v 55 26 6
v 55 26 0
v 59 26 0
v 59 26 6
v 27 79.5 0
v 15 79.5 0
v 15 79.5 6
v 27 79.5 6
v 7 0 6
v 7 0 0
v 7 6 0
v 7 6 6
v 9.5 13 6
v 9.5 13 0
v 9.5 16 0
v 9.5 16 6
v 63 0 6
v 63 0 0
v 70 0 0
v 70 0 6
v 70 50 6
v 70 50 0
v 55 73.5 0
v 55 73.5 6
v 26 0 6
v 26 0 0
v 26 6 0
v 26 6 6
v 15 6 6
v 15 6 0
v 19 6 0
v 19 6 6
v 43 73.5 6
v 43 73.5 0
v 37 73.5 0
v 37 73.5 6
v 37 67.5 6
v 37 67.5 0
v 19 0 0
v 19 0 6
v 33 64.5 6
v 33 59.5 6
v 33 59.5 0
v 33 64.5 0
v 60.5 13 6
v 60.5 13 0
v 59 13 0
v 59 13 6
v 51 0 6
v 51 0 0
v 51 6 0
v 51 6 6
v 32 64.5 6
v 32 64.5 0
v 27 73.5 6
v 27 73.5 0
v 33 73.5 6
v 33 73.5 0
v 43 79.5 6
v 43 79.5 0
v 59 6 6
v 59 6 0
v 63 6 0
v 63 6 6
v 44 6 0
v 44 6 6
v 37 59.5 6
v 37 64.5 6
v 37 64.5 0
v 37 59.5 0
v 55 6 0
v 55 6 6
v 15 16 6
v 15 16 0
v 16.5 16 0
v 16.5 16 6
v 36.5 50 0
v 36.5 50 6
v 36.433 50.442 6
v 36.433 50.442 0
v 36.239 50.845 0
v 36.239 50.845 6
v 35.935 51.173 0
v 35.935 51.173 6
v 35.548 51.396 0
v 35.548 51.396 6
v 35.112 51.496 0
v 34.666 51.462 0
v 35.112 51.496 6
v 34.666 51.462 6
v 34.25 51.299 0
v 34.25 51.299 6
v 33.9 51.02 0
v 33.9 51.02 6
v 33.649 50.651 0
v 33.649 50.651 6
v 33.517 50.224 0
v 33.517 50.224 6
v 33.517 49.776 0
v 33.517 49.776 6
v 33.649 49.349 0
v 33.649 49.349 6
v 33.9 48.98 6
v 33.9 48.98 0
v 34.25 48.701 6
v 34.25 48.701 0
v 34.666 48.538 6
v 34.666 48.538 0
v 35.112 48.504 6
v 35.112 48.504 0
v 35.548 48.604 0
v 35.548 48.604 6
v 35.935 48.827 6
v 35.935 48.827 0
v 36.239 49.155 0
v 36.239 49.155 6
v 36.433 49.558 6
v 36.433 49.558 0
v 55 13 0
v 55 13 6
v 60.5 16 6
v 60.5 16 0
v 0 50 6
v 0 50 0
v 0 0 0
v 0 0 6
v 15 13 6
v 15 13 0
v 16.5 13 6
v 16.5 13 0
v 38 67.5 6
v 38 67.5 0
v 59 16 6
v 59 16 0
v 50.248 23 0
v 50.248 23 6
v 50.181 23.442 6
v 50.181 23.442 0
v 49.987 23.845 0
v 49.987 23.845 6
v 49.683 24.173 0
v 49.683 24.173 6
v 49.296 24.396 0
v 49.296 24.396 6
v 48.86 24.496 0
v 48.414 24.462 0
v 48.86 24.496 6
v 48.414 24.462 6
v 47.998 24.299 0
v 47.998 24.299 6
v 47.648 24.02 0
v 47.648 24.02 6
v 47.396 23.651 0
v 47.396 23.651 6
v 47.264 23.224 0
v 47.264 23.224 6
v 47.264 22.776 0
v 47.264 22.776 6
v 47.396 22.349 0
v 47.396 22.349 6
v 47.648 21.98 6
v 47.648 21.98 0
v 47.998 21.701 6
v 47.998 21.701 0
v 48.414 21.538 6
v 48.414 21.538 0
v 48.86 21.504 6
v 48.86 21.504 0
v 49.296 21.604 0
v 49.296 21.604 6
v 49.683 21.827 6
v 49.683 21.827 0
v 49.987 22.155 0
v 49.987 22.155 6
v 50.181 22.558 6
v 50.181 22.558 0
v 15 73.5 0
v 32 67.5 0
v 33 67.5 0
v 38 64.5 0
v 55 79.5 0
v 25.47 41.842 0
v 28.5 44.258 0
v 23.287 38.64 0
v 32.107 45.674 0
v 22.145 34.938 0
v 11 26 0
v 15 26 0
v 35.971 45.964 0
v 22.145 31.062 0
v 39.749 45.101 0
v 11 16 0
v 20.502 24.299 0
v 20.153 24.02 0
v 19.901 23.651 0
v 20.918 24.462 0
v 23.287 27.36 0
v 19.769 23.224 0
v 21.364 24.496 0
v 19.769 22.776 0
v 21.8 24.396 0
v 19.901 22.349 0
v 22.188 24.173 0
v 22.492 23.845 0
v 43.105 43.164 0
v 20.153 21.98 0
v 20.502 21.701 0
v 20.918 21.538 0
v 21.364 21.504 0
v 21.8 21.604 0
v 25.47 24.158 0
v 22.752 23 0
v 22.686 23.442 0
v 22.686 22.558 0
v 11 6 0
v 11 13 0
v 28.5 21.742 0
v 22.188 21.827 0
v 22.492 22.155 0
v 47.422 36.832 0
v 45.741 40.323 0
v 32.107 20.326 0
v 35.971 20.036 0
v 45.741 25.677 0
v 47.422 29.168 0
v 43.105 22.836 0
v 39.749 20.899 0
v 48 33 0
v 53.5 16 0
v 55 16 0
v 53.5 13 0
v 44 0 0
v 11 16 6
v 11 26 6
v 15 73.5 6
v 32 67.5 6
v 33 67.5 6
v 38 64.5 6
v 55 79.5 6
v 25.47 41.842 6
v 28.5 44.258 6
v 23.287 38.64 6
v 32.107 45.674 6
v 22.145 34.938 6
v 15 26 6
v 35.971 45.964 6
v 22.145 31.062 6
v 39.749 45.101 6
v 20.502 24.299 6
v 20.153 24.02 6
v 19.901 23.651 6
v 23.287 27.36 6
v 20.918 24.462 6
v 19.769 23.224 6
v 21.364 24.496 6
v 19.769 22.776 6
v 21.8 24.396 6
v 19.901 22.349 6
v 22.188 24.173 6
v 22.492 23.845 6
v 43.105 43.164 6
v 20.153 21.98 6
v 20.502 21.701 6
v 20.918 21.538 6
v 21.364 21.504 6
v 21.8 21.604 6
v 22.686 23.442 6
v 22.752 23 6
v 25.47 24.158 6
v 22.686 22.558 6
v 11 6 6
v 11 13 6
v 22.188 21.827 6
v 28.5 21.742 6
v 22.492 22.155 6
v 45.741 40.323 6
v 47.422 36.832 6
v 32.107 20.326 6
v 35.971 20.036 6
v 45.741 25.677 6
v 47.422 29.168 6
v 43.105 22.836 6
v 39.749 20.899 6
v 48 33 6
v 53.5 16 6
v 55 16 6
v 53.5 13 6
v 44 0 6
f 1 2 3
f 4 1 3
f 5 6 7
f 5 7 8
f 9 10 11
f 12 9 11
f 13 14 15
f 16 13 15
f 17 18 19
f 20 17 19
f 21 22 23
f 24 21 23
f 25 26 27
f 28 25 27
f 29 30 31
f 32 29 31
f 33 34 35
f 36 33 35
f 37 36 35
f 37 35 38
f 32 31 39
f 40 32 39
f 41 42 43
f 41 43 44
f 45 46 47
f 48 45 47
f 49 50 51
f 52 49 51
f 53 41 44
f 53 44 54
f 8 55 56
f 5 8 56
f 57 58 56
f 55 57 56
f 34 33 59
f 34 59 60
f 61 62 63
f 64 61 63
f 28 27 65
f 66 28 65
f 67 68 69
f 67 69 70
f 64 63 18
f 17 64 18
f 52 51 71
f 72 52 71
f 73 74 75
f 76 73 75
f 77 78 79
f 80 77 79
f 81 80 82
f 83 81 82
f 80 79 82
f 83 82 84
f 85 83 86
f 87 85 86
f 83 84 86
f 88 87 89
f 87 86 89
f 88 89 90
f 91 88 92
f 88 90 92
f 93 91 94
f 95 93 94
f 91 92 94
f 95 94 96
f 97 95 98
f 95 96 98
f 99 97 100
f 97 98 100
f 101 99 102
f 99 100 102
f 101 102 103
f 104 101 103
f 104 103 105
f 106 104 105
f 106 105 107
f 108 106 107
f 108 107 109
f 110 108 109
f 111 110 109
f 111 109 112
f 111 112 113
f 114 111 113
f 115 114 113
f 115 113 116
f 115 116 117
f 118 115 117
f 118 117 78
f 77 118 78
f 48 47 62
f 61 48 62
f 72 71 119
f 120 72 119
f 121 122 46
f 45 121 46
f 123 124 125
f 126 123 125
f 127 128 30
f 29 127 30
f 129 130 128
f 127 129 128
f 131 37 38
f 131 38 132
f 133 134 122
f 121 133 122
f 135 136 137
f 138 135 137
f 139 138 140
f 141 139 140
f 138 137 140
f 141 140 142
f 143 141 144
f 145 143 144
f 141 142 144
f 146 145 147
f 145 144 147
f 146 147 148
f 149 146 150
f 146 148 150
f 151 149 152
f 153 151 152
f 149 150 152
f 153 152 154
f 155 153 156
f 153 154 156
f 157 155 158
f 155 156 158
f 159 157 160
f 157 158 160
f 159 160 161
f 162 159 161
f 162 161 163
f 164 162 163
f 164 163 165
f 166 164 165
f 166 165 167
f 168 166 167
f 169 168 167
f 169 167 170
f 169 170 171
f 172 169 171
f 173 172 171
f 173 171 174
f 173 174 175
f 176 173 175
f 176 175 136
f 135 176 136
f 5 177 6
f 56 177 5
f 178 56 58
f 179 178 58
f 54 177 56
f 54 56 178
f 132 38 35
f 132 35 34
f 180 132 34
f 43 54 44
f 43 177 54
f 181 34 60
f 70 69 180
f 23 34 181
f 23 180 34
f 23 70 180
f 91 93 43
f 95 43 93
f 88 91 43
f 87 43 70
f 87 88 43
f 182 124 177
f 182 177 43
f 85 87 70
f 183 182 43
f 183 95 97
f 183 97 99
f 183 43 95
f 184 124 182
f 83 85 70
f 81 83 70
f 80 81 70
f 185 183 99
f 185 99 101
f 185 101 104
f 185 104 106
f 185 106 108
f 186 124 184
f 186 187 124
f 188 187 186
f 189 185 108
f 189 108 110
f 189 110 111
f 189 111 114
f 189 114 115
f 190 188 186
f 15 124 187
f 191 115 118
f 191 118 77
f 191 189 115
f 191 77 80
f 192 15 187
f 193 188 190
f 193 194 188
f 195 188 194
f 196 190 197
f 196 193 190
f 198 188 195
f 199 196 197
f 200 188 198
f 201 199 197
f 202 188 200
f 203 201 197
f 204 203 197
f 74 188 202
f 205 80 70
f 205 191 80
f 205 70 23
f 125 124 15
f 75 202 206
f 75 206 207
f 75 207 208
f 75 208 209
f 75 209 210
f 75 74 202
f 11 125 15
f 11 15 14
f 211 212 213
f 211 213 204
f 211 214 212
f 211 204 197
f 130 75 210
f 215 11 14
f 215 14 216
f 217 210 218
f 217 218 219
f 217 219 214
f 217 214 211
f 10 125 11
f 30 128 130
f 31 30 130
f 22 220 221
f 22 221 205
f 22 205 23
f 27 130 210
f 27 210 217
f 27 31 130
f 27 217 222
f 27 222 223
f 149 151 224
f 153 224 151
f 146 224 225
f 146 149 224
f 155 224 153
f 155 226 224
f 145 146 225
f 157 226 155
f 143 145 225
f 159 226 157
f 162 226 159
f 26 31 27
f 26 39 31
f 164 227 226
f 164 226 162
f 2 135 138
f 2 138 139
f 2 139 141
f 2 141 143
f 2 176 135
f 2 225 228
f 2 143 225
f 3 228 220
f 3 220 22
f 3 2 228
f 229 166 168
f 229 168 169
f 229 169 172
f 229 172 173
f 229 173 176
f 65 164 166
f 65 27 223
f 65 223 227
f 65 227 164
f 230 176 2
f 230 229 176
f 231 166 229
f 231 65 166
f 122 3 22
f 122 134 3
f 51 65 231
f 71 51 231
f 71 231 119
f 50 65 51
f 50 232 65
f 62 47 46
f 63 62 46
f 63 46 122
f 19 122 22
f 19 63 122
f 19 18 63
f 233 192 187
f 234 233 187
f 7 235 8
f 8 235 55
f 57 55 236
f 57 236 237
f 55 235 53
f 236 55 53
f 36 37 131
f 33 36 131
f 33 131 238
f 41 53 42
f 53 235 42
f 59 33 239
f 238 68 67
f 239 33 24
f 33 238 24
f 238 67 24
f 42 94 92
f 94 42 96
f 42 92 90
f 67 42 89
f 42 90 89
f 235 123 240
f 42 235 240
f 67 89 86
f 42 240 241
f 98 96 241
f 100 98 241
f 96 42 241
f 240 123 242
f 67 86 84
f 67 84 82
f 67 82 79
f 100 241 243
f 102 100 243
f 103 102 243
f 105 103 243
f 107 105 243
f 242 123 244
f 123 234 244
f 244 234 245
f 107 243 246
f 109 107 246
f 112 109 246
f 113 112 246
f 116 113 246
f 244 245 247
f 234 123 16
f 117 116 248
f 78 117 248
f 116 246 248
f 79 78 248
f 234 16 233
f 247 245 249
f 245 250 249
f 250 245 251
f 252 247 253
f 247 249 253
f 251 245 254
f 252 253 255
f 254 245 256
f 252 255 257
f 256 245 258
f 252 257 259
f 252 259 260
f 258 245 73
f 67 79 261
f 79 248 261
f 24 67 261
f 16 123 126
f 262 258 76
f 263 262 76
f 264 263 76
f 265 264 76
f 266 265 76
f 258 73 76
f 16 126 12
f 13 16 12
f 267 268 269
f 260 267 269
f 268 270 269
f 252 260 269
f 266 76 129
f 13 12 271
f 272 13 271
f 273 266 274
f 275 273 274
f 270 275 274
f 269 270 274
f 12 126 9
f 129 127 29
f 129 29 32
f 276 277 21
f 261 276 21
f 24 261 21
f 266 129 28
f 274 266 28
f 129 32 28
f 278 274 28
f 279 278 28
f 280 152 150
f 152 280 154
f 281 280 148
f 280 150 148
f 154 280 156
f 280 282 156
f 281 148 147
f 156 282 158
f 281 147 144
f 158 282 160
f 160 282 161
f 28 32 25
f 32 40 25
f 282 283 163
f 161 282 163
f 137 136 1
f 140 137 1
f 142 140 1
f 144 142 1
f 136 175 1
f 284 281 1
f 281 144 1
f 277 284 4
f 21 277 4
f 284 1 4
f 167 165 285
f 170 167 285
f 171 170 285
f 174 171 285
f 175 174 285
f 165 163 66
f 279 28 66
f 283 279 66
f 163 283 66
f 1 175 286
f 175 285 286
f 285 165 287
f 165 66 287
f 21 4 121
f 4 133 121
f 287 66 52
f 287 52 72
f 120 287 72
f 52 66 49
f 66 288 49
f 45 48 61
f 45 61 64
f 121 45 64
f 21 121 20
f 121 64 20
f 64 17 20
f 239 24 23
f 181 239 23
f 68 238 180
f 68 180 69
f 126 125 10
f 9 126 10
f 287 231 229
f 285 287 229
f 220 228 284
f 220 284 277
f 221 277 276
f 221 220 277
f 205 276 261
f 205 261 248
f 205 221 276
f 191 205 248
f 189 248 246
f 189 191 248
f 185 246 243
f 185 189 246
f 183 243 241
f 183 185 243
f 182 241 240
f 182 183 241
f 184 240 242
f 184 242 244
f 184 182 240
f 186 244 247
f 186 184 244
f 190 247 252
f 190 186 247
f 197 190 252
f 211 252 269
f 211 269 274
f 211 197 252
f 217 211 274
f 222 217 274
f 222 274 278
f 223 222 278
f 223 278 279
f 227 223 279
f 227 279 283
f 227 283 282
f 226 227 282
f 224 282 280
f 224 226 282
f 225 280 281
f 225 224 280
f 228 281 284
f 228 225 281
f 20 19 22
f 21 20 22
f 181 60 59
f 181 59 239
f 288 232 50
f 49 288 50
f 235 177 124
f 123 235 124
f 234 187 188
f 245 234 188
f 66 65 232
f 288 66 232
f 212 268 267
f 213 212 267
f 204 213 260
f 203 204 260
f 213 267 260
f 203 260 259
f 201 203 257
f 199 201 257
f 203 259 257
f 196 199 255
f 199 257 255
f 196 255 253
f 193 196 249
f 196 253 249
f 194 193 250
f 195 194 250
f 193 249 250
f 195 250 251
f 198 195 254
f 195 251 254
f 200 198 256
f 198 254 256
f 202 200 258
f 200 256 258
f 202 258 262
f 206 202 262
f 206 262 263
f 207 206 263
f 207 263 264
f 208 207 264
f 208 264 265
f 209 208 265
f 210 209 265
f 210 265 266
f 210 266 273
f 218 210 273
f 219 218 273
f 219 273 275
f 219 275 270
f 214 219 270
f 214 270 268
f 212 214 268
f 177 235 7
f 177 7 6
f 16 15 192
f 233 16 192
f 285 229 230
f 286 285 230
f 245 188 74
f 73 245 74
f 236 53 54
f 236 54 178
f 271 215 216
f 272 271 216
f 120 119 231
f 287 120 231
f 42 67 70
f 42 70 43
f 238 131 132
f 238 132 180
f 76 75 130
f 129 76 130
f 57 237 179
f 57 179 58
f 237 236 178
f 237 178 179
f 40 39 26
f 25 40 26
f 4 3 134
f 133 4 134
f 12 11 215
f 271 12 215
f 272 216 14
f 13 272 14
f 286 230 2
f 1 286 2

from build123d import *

# Parameters (mm, degrees)
ESQUISSE1_R             = 13
BOSS_EXTRU_1_DEPTH      = 6
ESQUISSE2_W             = 12
ESQUISSE2_H             = 6
BOSS_EXTRU_2_DEPTH      = 6
ESQUISSE3_R             = 1.5
ENL_V_MAT_EXTRU_1_DEPTH = 10
ENL_V_MAT_EXTRU_2_DEPTH = 10


with BuildPart() as part:
    # Esquisse1 → Boss.-Extru.1 (new body)
    with BuildSketch(Plane.XY):
        Polygon((55, 13), (53.5, 13), (53.5, 16), (55, 16), (55, 26), (59, 26), (59, 16), (60.5, 16), (60.5, 13), (59, 13), (59, 6), (63, 6), (63, 0), (70, 0), (70, 50), (55, 73.5), (15, 73.5), (0, 50), (0, 0), (7, 0), (7, 6), (11, 6), (11, 13), (9.5, 13), (9.5, 16), (11, 16), (11, 26), (15, 26), (15, 16), (16.5, 16), (16.5, 13), (15, 13), (15, 6), (19, 6), (19, 0), (26, 0), (26, 6), (44, 6), (44, 0), (51, 0), (51, 6), (55, 6), align=None)
        with Locations((35, 33)):
            Circle(ESQUISSE1_R, mode=Mode.SUBTRACT)
    extrude(amount=BOSS_EXTRU_1_DEPTH)

    # Esquisse2 → Boss.-Extru.2 (add)
    with BuildSketch(Plane(origin=(0, 73.5, 0), x_dir=(1, 0, 0), z_dir=(0, 1, 0))):
        with Locations((21, -3)):
            Rectangle(ESQUISSE2_W, ESQUISSE2_H)
        with Locations((49, -3)):
            Rectangle(ESQUISSE2_W, ESQUISSE2_H)
    extrude(amount=BOSS_EXTRU_2_DEPTH)

    # Esquisse3 → Enlèv. mat.-Extru.1 (cut)
    with BuildSketch(Plane.XY.offset(6)):
        with Locations((21.252272915, 23)):
            Circle(ESQUISSE3_R)
        with Locations((48.747727085, 23)):
            Circle(ESQUISSE3_R)
        with Locations((35, 50)):
            Circle(ESQUISSE3_R)
    extrude(amount=-ENL_V_MAT_EXTRU_1_DEPTH, mode=Mode.SUBTRACT)

    # Esquisse4 → Enlèv. mat.-Extru.2 (cut)
    with BuildSketch(Plane.XY.offset(6)):
        Polygon((33, 73.5), (37, 73.5), (37, 67.5), (38, 67.5), (38, 64.5), (37, 64.5), (37, 59.5), (33, 59.5), (33, 64.5), (32, 64.5), (32, 67.5), (33, 67.5), align=None)
    extrude(amount=-ENL_V_MAT_EXTRU_2_DEPTH, mode=Mode.SUBTRACT)


solid = part.part
